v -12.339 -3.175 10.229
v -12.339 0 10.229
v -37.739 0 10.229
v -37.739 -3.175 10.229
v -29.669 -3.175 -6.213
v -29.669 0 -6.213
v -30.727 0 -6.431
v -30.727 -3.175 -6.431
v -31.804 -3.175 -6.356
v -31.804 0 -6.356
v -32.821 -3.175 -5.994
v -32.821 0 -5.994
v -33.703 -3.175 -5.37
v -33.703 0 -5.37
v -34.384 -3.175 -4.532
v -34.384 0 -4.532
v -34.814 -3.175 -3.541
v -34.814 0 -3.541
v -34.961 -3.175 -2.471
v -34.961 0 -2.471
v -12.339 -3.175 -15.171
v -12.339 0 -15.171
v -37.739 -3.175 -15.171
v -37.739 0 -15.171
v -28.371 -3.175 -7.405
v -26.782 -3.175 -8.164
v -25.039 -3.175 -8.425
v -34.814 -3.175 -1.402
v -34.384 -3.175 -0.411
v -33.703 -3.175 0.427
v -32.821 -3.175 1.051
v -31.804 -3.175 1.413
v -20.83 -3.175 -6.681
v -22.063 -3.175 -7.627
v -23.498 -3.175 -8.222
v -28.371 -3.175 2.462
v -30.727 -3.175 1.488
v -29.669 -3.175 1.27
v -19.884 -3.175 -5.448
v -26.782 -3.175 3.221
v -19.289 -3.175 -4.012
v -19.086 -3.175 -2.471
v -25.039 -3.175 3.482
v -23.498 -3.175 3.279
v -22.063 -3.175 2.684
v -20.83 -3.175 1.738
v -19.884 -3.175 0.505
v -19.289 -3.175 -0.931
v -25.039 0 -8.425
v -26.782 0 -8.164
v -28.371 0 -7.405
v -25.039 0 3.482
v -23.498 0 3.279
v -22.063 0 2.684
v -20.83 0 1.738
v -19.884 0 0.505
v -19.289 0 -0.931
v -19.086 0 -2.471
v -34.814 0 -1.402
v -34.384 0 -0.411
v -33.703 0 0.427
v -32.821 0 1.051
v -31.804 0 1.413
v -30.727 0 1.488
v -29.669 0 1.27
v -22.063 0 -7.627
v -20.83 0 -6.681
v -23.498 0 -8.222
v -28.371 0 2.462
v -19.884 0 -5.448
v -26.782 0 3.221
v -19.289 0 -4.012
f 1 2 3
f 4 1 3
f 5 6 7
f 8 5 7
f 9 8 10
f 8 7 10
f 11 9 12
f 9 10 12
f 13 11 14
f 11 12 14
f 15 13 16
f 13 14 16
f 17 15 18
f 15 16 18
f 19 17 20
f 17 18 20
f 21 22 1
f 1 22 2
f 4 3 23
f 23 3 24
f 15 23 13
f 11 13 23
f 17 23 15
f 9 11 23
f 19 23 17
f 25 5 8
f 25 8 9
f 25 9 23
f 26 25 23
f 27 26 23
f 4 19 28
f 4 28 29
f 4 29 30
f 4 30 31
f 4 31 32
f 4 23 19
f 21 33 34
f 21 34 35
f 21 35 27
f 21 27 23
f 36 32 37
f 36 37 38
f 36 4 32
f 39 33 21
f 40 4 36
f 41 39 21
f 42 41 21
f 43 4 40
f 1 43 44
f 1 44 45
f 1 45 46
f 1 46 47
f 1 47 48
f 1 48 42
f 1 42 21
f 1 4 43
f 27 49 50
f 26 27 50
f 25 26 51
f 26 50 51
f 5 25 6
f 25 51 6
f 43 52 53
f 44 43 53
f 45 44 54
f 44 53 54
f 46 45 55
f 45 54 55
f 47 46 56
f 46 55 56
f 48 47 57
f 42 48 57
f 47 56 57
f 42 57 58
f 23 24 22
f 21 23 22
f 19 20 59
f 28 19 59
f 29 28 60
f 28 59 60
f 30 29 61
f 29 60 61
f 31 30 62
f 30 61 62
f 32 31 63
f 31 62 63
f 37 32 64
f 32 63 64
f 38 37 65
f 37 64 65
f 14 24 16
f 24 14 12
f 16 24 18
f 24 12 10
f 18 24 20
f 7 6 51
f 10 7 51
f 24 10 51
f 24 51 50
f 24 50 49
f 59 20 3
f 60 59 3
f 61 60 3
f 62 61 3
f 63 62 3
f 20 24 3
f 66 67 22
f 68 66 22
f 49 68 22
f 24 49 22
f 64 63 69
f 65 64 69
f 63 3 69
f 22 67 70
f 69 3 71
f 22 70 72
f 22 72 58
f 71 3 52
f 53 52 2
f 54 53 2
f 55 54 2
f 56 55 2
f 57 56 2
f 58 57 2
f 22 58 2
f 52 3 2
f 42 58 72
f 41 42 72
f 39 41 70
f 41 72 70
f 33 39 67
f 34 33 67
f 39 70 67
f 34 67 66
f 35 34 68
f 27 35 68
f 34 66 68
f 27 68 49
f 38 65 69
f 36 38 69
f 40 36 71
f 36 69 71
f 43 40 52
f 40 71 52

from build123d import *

# Parameters (mm, degrees)
F1_DEPTH = 3.175


with BuildPart() as f1:
    # F0 (on Front) → F1 (new body)
    with BuildSketch(Plane.XZ):
        with BuildLine():
            Line((-25.0390999136, 10.2285252111), (-37.7390999136, 10.2285252111))
            Line((-37.7390999136, 10.2285252111), (-37.7390999136, -2.4714747889))
            Line((-37.7390999136, -2.4714747889), (-34.9609749136, -2.4714747889))
            ThreePointArc((-34.9609749136, -2.4714747889), (-33.2835837944, 0.7689960166), (-29.6693082469, 1.2702985949))
            ThreePointArc((-29.6693082469, 1.2702985949), (-27.6046848946, 2.90044023), (-25.0390999136, 3.4816502111))
            Line((-25.0390999136, 3.4816502111), (-25.0390999136, 10.2285252111))
        make_face()
        with BuildLine():
            Line((-12.3390999136, 10.2285252111), (-25.0390999136, 10.2285252111))
            Line((-25.0390999136, 10.2285252111), (-25.0390999136, 3.4816502111))
            ThreePointArc((-25.0390999136, 3.4816502111), (-20.8296048568, 1.7380202678), (-19.0859749136, -2.4714747889))
            Line((-19.0859749136, -2.4714747889), (-12.3390999136, -2.4714747889))
            Line((-12.3390999136, -2.4714747889), (-12.3390999136, 10.2285252111))
        make_face()
        with BuildLine():
            Line((-12.3390999136, -15.1714747889), (-12.3390999136, -2.4714747889))
            Line((-12.3390999136, -2.4714747889), (-19.0859749136, -2.4714747889))
            ThreePointArc((-19.0859749136, -2.4714747889), (-20.8296048568, -6.6809698457), (-25.0390999136, -8.4245997889))
            Line((-25.0390999136, -8.4245997889), (-25.0390999136, -15.1714747889))
            Line((-25.0390999136, -15.1714747889), (-12.3390999136, -15.1714747889))
        make_face()
        with BuildLine():
            Line((-34.9609749136, -2.4714747889), (-37.7390999136, -2.4714747889))
            Line((-37.7390999136, -2.4714747889), (-37.7390999136, -15.1714747889))
            Line((-37.7390999136, -15.1714747889), (-25.0390999136, -15.1714747889))
            Line((-25.0390999136, -15.1714747889), (-25.0390999136, -8.4245997889))
            ThreePointArc((-25.0390999136, -8.4245997889), (-27.6046848946, -7.8433898078), (-29.6693082469, -6.2132481727))
            ThreePointArc((-29.6693082469, -6.2132481727), (-33.2835837944, -5.7119455945), (-34.9609749136, -2.4714747889))
        make_face()
    extrude(amount=F1_DEPTH)


solid = f1.part
